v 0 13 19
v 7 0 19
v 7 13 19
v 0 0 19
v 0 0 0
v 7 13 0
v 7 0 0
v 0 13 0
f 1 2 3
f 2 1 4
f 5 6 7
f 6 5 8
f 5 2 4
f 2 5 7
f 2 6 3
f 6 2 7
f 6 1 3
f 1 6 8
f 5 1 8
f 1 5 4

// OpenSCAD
// Generated by SolidPython 1.0.1 on 2020-07-29 00:39:26


cube(size = [7, 13, 19]);
/***********************************************
*********      SolidPython code:      **********
************************************************
 
# import packages: SolidPython
from solid import *
from solid.utils import *
from itertools import chain, combinations


class Resize:

    def __init__(self, scad_file):
        self.scad_file = scad_file
        #self.scad_file = import_scad(scad_file)
        # cone/cylinder param:
        self.r1 = 0
        self.r2 = 0
        self.h = 0
        # rectangular prism param:
        self.w = 0
        self.l = 0
        # ellipse param:
        self.r = 0

    # import OpenScad code (file name corresponds to shape)


    # classify shape + parameters
    def assign(self, param1, param2, param3):
        if self.scad_file == 'cone.scad':
            self.r1 = param1
            self.r2 = param2
            self.h = param3
        elif self.scad_file == 'cylinder.scad':
            self.r1 = param1
            self.r2 = param2
            self.h = param3
        elif self.scad_file == 'rectangularPrism.scad':
            self.h = param1
            self.l = param2
            self.w = param3
        else:
            self.r = param1
            self.h = param2

    # resize parameters
    def iterate(self):
        x = range(3, 20, 2)
        i = 1
        if self.scad_file == 'cone.scad':
            tempList = list(combinations(x, 2))
            for temp in tempList:
                param1 = temp[0]
                param2 = temp[1]
                filepath = 'produced_scad_files/' + 'cone' + str(param1) + '_' + str(param2) + '_' + '.scad'
                scad_render_to_file(cylinder(h=param1, r1=param2, r2=0), filepath)

        elif self.scad_file == 'cylinder.scad':
            tempList = list(combinations(x, 3))
            for temp in tempList:
                param1 = temp[0]
                param2 = temp[1]
                filepath = 'produced_scad_files/' + 'cylinder' + str(param1) + '_' + str(param2) + '_' + '.scad'
                scad_render_to_file(cylinder(h=param1, r1=param2, r2=param2), filepath)

        elif self.scad_file == 'rectangularPrism.scad':
            tempList = list(combinations(x, 3))
            for temp in tempList:
                param1 = temp[0]
                param2 = temp[1]
                param3 = temp[2]
                filepath = 'produced_scad_files/' + 'rectangularPrism' + str(param1) + '_' + str(param2) + '_' + str(
                    param3) + '.scad'
                scad_render_to_file(cube(size=(param1, param2, param3)), filepath)

        elif self.scad_file == 'ellipse.scad':
            tempList = list(combinations(x, 4))
            for temp in tempList:
                param1 = temp[0]
                param2 = temp[1]
                param3 = temp[2]
                param4 = temp[3]
                filepath = 'produced_scad_files/' + 'ellipse' + str(param1) + '_' + str(param2) + '_' + str(param3) + '_' + str(param4) + '.scad'
                scad_render_to_file(scale([param1, param2, param3])(sphere(r=param4)), filepath)

    def render_to_scadfile(self):
        scad_render_to_file(scad, 'example.scad') 
 
************************************************/
